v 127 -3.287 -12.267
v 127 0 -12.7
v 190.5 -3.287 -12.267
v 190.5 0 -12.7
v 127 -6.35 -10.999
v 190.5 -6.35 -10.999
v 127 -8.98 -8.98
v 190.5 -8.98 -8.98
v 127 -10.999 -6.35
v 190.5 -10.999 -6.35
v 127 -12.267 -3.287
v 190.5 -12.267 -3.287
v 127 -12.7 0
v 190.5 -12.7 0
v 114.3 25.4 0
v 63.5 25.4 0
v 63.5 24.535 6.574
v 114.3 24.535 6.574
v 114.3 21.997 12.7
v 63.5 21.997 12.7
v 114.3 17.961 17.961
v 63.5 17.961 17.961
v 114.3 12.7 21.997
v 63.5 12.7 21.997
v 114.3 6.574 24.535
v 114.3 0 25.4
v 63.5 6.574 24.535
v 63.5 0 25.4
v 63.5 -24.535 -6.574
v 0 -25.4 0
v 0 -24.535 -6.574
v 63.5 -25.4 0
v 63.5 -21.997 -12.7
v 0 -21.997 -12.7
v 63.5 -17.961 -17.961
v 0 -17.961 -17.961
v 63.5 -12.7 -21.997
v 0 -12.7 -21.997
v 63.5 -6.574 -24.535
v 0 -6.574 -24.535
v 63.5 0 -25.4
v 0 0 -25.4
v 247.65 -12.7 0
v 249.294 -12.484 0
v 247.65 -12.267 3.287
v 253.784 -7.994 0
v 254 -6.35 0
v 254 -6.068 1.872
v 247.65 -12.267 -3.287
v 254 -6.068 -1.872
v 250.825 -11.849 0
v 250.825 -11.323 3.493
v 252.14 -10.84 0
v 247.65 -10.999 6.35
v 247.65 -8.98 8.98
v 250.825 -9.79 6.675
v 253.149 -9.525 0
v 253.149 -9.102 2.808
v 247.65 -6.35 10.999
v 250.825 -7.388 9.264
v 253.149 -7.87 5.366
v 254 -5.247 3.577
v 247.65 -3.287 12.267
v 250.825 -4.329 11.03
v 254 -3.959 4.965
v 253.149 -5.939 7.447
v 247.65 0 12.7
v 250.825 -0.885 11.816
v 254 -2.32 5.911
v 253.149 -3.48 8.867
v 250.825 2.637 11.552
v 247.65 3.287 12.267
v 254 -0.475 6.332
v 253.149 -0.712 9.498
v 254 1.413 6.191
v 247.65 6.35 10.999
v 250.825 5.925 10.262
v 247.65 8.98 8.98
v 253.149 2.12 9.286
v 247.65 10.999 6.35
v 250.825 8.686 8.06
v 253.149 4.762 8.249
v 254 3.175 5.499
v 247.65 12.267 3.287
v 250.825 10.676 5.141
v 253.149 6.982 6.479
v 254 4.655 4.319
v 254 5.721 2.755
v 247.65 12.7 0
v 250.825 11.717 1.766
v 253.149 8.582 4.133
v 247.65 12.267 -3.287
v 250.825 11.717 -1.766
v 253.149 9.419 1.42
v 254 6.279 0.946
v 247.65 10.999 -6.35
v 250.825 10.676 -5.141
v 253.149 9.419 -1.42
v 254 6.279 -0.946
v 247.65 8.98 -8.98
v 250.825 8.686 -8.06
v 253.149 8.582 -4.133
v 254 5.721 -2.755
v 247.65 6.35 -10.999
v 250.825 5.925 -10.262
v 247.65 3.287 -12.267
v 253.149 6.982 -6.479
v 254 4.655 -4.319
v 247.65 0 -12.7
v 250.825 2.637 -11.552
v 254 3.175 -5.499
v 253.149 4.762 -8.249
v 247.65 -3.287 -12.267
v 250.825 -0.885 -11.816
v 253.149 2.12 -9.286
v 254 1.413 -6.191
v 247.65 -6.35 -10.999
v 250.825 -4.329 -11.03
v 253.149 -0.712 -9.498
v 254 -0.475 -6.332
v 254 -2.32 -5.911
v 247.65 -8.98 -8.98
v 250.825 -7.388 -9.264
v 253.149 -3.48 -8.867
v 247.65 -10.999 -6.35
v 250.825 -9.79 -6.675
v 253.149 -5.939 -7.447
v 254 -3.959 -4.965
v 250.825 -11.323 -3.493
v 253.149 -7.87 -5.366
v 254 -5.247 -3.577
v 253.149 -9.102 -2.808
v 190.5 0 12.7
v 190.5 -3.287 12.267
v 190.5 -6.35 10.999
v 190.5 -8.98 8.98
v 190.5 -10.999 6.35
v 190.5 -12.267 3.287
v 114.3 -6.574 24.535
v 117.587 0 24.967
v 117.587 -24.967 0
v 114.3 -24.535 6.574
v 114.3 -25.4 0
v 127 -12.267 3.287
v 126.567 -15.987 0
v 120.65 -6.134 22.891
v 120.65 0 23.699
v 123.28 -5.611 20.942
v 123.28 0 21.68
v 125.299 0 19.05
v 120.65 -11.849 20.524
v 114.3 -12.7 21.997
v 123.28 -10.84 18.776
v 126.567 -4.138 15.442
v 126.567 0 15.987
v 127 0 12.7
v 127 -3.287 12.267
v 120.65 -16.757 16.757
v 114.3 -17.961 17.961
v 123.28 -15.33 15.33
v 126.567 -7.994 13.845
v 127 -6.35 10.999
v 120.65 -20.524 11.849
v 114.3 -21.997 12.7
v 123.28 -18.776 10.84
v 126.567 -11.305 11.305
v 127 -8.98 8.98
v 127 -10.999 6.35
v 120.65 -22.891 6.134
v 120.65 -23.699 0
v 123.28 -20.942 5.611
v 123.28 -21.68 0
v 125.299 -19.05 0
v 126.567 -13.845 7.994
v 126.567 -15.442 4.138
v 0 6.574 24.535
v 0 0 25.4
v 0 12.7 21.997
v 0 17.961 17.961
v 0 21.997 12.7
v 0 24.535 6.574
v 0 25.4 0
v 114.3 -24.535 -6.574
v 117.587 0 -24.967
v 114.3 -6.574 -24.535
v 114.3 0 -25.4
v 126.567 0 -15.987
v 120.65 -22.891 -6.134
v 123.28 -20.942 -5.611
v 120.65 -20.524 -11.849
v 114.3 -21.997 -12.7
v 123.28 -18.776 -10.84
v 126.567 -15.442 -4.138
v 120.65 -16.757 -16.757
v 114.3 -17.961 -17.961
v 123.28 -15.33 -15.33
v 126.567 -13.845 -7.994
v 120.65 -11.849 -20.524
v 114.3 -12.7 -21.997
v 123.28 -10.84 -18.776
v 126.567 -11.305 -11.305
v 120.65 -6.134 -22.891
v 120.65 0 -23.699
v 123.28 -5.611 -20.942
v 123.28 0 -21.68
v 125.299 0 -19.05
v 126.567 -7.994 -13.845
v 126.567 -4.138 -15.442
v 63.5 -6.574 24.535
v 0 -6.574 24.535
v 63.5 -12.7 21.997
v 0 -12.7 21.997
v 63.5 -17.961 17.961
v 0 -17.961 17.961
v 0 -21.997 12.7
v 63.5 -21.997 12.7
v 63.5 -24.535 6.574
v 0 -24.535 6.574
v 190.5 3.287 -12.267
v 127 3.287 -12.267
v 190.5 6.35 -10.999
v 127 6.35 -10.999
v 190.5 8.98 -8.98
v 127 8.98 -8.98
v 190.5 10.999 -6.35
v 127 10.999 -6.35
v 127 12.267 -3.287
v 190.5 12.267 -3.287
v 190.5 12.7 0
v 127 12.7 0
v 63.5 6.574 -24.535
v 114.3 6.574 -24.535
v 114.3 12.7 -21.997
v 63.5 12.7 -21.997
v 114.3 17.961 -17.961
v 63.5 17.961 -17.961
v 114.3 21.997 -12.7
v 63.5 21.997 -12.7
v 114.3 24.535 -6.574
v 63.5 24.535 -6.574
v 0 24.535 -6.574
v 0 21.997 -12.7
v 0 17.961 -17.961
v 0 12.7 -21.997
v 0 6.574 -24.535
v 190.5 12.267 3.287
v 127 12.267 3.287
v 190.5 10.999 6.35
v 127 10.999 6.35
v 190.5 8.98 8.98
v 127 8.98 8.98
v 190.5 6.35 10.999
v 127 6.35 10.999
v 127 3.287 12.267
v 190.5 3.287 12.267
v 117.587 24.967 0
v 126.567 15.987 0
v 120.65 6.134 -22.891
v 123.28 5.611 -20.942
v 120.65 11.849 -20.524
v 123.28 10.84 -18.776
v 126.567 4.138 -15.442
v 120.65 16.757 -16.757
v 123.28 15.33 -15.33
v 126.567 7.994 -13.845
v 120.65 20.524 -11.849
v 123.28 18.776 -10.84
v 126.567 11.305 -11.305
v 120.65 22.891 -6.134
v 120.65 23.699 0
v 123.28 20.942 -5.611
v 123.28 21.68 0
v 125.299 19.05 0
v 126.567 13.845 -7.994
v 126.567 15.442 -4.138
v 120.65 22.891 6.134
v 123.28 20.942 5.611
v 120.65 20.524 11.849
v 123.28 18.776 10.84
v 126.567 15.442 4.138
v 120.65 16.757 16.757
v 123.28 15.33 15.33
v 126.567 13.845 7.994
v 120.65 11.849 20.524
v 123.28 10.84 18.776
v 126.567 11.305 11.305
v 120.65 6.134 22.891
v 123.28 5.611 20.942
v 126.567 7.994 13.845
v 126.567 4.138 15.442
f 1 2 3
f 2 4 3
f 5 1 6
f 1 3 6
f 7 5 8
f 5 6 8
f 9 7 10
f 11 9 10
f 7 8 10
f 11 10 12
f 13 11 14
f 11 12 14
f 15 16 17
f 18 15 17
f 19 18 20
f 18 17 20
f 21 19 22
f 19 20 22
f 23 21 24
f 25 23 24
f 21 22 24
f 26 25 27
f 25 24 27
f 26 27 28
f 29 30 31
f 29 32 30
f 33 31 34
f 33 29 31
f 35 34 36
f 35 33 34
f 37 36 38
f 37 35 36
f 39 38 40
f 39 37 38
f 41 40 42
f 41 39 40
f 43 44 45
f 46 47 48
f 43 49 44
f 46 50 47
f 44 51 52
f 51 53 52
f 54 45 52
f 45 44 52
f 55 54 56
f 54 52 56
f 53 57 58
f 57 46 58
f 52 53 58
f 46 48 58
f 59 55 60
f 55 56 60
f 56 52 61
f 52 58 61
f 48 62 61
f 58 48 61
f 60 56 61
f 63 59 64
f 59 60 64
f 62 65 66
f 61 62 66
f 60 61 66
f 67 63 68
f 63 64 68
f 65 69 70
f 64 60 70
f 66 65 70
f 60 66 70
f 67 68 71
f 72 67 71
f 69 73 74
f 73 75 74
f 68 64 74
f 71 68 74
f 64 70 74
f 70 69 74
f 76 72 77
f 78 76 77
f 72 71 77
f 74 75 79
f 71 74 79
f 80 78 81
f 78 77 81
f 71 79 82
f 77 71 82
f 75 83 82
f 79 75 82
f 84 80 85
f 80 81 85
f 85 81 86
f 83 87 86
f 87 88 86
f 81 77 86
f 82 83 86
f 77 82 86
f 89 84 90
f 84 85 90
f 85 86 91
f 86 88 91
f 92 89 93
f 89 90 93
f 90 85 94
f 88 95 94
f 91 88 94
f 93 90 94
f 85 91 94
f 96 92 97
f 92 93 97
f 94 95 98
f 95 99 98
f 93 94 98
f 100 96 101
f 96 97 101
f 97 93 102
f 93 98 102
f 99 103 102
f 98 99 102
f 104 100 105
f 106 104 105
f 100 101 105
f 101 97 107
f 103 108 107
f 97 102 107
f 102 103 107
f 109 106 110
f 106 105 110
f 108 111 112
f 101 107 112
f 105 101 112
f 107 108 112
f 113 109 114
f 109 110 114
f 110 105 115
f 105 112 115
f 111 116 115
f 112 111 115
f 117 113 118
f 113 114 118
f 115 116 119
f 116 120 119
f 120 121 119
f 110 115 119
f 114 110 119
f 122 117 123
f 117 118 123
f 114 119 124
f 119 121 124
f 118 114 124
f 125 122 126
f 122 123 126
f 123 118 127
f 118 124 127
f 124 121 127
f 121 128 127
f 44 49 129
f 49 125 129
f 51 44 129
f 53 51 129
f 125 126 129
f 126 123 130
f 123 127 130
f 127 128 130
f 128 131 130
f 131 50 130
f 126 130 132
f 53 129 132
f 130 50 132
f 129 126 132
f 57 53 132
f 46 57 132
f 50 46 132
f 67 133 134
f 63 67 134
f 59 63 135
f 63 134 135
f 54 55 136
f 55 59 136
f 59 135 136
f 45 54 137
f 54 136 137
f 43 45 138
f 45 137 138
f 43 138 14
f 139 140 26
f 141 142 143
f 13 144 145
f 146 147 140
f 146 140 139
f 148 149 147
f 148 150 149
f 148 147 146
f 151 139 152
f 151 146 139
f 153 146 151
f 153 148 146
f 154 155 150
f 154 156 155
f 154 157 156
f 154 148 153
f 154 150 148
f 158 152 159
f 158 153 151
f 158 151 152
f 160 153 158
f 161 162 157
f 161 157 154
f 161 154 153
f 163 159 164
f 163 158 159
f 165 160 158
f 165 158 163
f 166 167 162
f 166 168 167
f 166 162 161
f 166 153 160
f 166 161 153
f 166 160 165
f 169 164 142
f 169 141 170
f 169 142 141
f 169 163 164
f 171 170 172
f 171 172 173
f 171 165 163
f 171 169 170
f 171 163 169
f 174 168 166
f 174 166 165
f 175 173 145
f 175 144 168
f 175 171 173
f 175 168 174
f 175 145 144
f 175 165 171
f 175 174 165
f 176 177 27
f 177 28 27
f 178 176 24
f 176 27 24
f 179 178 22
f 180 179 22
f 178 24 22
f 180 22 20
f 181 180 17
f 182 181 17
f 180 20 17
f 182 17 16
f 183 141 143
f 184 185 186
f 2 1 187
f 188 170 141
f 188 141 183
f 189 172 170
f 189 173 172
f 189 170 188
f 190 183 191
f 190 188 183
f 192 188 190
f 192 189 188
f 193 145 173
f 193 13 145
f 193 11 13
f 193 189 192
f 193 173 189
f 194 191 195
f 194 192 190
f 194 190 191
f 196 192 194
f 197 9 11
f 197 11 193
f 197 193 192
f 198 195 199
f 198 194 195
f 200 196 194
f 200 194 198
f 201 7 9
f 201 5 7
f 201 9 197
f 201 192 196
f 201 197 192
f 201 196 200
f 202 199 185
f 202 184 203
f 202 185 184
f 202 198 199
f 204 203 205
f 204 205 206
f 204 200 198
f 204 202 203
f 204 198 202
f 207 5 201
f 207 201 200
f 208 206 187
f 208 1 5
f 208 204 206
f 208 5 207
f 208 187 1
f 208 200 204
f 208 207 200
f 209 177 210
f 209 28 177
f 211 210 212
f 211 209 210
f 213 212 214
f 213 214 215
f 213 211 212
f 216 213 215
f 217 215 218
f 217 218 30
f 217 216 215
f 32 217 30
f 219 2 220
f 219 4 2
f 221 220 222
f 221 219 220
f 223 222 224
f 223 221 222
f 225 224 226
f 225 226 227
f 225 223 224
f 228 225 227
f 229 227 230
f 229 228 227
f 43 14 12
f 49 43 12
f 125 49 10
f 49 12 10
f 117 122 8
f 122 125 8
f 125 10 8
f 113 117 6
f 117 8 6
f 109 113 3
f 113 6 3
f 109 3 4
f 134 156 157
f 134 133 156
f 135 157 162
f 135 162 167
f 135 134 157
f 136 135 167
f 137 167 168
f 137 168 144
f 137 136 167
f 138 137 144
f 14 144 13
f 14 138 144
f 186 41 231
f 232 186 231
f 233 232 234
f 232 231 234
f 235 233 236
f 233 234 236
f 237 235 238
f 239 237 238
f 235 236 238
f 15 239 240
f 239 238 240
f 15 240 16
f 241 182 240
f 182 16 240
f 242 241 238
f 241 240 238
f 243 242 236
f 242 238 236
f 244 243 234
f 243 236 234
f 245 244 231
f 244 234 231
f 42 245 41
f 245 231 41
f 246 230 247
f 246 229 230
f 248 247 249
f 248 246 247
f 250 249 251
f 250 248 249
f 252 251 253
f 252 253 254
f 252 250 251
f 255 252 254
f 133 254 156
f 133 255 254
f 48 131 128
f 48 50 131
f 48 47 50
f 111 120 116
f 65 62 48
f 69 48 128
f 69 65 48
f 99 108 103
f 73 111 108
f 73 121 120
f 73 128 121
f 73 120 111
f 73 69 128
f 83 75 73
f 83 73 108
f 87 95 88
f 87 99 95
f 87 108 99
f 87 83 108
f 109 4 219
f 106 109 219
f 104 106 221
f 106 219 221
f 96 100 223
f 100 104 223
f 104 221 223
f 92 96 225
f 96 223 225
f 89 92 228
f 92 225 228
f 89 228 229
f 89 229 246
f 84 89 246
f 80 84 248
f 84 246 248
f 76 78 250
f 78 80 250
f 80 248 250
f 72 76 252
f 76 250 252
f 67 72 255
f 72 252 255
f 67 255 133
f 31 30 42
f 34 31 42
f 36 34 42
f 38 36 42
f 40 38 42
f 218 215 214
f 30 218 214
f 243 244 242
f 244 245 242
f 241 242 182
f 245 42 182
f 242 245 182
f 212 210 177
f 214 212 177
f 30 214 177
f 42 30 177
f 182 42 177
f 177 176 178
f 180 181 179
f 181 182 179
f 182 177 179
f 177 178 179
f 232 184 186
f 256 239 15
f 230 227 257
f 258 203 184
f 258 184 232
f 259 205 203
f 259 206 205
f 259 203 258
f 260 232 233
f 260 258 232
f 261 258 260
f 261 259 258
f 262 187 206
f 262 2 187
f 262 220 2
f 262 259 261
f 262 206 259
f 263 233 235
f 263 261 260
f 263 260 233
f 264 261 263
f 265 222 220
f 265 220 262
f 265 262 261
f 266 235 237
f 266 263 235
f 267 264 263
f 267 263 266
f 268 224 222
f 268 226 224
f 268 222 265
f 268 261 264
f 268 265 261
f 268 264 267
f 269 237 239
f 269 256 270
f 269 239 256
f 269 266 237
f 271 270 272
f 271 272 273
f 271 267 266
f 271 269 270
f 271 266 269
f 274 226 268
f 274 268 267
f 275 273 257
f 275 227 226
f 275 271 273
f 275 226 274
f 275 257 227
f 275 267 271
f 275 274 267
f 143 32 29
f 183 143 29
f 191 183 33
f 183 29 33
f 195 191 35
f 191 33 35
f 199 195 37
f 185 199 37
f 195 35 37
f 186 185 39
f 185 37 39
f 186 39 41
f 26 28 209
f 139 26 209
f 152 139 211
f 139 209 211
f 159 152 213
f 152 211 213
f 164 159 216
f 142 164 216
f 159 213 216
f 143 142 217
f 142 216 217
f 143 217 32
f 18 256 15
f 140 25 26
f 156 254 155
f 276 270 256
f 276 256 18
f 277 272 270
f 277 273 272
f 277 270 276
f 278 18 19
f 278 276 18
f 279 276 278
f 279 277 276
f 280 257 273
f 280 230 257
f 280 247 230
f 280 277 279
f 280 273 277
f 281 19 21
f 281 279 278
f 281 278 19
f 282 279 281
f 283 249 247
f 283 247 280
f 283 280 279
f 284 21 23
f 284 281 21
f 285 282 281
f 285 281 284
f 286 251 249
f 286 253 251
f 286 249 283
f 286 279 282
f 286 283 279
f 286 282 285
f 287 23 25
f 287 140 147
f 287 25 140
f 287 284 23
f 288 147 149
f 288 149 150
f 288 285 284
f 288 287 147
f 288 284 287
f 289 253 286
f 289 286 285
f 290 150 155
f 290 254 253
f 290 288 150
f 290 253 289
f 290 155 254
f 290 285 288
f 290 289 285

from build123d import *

# Parameters (mm, degrees)
F1_DEPTH = 254
F2_DEPTH = 190.5
F3_DEPTH = 127
F4_DEPTH = 63.5
F5_R     = 12.6999
F6_R     = 25.3999
F7_R     = 12.6999


# Not quite as in the source:
# - a fillet or chamfer that OpenCascade refuses, or shapes differently, is made with other operations: its cross-section is extruded or revolved along the edge and cut away or added
# - a fillet or chamfer is up to 0.001 mm smaller than in the source, because OpenCascade refuses the exact size


with BuildPart() as f1:
    # F0 (on Right) → F1 (new body)
    with BuildSketch(Plane.YZ):
        with BuildLine():
            ThreePointArc((12.7, 0), (8.9802561211, 8.9802561211), (0, 12.7))
            ThreePointArc((0, 12.7), (-8.9802561211, 8.9802561211), (-12.7, 0))
            ThreePointArc((-12.7, 0), (-8.9802561211, -8.9802561211), (0, -12.7))
            ThreePointArc((0, -12.7), (8.9802561211, -8.9802561211), (12.7, 0))
        make_face()
    extrude(amount=F1_DEPTH)

    # F0 (on Right) → F2 (join)
    with BuildSketch(Plane.YZ):
        with BuildLine():
            ThreePointArc((-12.7, 0), (-8.9802561211, 8.9802561211), (0, 12.7))
            Line((0, 12.7), (-12.7, 12.7))
            Line((-12.7, 12.7), (-12.7, 0))
        make_face()
        with BuildLine():
            Line((12.7, 12.7), (0, 12.7))
            ThreePointArc((0, 12.7), (8.9802561211, 8.9802561211), (12.7, 0))
            Line((12.7, 0), (12.7, 12.7))
        make_face()
        with BuildLine():
            Line((12.7, -12.7), (12.7, 0))
            ThreePointArc((12.7, 0), (8.9802561211, -8.9802561211), (0, -12.7))
            Line((0, -12.7), (12.7, -12.7))
        make_face()
        with BuildLine():
            ThreePointArc((0, -12.7), (-8.9802561211, -8.9802561211), (-12.7, 0))
            Line((-12.7, 0), (-12.7, -12.7))
            Line((-12.7, -12.7), (0, -12.7))
        make_face()
    extrude(amount=F2_DEPTH)

    # F0 (on Right) → F3 (join)
    with BuildSketch(Plane.YZ):
        with BuildLine():
            ThreePointArc((25.4, 0), (17.9605122421, 17.9605122421), (0, 25.4))
            ThreePointArc((0, 25.4), (-17.9605122421, 17.9605122421), (-25.4, 0))
            ThreePointArc((-25.4, 0), (-17.9605122421, -17.9605122421), (0, -25.4))
            ThreePointArc((0, -25.4), (17.9605122421, -17.9605122421), (25.4, 0))
        make_face()
        Polygon((-12.7, 12.7), (0, 12.7), (12.7, 12.7), (12.7, 0), (12.7, -12.7), (0, -12.7), (-12.7, -12.7), (-12.7, 0), align=None, mode=Mode.SUBTRACT)
    extrude(amount=F3_DEPTH)

    # F0 (on Right) → F4 (join)
    with BuildSketch(Plane.YZ):
        with BuildLine():
            ThreePointArc((-25.4, 0), (-17.9605122421, 17.9605122421), (0, 25.4))
            Line((0, 25.4), (-25.4, 25.4))
            Line((-25.4, 25.4), (-25.4, 0))
        make_face()
        with BuildLine():
            ThreePointArc((0, -25.4), (-17.9605122421, -17.9605122421), (-25.4, 0))
            Line((-25.4, 0), (-25.4, -25.4))
            Line((-25.4, -25.4), (0, -25.4))
        make_face()
        with BuildLine():
            Line((25.4, -25.4), (25.4, 0))
            ThreePointArc((25.4, 0), (17.9605122421, -17.9605122421), (0, -25.4))
            Line((0, -25.4), (25.4, -25.4))
        make_face()
        with BuildLine():
            Line((25.4, 25.4), (0, 25.4))
            ThreePointArc((0, 25.4), (17.9605122421, 17.9605122421), (25.4, 0))
            Line((25.4, 0), (25.4, 25.4))
        make_face()
    extrude(amount=F4_DEPTH)

    # F5 (radius 12.7 in the source; OpenCascade refuses exactly that, so slightly less here)
    f5_edges = [f1.edges().sort_by_distance(p)[0] for p in [
        (158.75, -12.7, -12.7),
        (158.75, 12.7, -12.7),
        (158.75, 12.7, 12.7),
        (158.75, -12.7, 12.7),
    ]]
    fillet(f5_edges, radius=F5_R)

    # F6 (radius 25.4 in the source; OpenCascade refuses exactly that, so slightly less here)
    f6_edges = [f1.edges().sort_by_distance(p)[0] for p in [
        (31.75, -25.4, -25.4),
        (31.75, 25.4, -25.4),
        (31.75, -25.4, 25.4),
        (31.75, 25.4, 25.4),
    ]]
    fillet(f6_edges, radius=F6_R)

    # F7 (radius 12.7 in the source; OpenCascade refuses exactly that, so slightly less here)
    f7_edges = [f1.edges().sort_by_distance(p)[0] for p in [
        (127, 25.4, 0),
    ]]
    fillet(f7_edges, radius=F7_R)

    # F8: fillet of radius 6.35 on 1 edges, made by hand

    # F8_s1 → F8_t2 (revolve, cut)
    with BuildSketch(Plane.XY):
        with BuildLine():
            ThreePointArc((247.65, -12.7), (252.1401280605, -10.8401280605), (254, -6.35))
            Line((254, -6.35), (254, -12.7))
            Line((254, -12.7), (247.65, -12.7))
        make_face()
    revolve(axis=Axis((254, 0, 0), (-1, 0, 0)), mode=Mode.SUBTRACT)


solid = f1.part
